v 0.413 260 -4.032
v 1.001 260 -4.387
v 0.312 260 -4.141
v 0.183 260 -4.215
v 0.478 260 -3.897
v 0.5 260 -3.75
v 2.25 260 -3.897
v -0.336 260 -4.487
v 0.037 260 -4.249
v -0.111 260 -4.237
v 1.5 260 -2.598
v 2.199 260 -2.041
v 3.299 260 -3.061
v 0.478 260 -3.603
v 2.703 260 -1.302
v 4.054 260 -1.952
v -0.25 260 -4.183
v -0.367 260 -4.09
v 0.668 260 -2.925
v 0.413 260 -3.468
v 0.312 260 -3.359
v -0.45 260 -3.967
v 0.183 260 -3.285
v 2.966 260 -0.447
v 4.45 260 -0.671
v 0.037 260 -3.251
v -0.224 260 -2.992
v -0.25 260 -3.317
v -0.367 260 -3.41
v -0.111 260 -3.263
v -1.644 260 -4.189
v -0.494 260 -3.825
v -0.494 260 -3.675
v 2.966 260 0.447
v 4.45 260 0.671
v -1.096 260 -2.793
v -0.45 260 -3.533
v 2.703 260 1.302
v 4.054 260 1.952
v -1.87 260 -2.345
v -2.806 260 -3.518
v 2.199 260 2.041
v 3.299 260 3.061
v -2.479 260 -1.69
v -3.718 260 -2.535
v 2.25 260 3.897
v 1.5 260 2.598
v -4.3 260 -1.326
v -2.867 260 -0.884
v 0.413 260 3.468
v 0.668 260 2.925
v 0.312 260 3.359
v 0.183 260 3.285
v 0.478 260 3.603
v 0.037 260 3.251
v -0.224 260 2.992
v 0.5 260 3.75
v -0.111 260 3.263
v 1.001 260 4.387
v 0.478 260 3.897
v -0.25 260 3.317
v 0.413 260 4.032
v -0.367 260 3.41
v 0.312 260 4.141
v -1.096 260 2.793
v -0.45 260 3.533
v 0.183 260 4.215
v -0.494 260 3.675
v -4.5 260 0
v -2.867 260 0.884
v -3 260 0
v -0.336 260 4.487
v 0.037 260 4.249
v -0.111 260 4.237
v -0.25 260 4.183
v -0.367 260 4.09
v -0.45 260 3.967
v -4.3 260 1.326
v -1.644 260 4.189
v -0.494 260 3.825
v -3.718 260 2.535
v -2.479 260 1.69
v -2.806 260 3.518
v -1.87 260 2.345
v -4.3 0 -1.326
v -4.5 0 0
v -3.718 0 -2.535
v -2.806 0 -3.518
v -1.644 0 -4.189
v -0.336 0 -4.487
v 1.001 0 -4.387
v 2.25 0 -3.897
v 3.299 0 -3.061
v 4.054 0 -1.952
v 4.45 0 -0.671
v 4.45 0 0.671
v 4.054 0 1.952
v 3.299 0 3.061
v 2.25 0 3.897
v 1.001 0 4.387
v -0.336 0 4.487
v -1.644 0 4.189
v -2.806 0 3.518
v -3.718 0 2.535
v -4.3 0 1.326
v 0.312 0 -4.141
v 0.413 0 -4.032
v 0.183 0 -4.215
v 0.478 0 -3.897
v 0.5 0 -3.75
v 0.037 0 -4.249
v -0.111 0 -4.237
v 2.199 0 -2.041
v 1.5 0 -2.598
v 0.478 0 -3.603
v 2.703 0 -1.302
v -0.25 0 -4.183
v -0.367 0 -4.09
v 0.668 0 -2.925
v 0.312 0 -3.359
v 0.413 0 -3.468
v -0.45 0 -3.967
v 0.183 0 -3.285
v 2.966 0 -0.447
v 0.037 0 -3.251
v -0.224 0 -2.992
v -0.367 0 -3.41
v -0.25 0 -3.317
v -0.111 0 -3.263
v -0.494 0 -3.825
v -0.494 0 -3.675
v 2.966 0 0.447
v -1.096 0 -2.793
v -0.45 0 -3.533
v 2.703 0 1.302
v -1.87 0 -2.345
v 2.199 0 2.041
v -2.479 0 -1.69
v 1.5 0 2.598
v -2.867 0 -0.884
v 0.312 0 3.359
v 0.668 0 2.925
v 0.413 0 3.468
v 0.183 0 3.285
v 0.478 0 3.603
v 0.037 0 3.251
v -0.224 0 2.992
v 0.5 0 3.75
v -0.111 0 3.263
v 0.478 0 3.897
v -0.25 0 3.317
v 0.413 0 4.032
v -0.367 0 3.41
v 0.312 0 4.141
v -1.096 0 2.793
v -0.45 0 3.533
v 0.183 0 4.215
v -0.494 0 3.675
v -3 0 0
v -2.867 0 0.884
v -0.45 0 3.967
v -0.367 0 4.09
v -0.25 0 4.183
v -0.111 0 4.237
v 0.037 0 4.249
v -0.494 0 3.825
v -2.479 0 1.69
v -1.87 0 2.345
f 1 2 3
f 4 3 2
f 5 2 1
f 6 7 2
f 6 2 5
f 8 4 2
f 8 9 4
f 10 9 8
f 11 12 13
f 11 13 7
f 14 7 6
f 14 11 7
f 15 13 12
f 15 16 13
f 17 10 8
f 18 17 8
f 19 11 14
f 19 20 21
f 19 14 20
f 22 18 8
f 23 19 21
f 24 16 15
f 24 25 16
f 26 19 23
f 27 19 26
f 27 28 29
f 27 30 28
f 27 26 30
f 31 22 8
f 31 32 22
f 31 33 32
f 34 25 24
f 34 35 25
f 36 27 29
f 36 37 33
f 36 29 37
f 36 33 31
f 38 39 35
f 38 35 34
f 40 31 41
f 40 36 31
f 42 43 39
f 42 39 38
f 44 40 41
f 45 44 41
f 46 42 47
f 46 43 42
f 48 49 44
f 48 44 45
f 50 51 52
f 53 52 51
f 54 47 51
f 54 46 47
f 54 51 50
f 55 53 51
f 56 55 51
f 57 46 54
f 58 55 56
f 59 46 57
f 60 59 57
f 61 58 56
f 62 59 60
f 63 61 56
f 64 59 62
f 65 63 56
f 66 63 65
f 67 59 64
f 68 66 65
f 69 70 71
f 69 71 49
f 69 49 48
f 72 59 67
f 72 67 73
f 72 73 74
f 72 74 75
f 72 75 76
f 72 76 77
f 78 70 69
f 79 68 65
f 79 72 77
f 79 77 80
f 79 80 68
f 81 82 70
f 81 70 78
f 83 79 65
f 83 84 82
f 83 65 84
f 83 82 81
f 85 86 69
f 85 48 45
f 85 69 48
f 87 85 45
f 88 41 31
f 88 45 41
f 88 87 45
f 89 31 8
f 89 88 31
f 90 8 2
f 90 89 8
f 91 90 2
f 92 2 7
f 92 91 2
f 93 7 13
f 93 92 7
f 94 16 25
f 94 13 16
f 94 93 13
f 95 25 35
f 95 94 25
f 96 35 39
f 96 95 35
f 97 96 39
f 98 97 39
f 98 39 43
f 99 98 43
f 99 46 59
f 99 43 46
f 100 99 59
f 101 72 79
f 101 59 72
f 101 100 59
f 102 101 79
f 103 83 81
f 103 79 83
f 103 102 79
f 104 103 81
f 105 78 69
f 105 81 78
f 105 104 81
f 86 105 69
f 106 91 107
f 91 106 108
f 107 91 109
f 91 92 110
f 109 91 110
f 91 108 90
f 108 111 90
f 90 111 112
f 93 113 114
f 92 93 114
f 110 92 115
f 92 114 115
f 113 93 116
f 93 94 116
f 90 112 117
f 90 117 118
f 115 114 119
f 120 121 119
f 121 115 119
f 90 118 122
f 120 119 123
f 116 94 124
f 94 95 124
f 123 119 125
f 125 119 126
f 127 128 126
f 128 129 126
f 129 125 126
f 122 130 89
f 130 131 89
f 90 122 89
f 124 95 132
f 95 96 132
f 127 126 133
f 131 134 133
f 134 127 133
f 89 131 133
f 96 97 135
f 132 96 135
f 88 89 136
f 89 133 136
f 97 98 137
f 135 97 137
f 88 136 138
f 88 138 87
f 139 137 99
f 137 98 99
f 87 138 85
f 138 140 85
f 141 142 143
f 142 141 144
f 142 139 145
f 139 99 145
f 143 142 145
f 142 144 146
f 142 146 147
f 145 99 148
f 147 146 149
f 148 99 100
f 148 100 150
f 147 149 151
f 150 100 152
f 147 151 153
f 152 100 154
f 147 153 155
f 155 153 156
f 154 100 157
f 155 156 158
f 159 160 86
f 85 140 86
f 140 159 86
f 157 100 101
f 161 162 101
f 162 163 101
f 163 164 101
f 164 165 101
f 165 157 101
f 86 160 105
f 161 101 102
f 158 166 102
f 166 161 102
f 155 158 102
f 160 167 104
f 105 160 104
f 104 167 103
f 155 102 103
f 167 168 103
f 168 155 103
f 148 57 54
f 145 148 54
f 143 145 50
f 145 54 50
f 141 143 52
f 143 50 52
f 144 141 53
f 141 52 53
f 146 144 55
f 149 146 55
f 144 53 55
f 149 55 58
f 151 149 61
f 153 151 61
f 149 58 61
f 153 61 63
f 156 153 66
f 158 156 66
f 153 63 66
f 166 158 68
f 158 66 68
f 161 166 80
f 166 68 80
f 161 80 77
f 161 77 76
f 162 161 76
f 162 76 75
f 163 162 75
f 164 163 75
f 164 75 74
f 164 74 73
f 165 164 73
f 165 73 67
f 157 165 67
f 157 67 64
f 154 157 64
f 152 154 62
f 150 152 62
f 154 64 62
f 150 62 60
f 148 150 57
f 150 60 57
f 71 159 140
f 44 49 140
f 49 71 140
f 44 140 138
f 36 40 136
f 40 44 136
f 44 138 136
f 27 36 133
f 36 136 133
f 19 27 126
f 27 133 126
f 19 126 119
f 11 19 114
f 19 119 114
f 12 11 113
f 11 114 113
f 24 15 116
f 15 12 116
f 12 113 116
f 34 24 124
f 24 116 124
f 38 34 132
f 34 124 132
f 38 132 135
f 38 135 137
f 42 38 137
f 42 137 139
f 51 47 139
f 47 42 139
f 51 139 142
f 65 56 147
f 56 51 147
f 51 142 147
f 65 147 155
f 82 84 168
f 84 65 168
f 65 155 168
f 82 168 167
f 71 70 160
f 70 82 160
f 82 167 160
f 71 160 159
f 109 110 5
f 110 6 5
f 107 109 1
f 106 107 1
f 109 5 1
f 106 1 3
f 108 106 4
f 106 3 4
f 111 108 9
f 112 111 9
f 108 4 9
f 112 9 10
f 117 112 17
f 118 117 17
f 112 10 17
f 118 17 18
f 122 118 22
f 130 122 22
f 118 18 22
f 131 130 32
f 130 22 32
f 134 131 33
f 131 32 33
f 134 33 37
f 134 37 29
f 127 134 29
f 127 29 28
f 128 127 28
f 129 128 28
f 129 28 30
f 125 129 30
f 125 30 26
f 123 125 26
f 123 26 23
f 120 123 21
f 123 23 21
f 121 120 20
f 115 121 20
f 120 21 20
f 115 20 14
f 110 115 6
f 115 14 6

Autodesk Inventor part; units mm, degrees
ref_plane "YZ Plane" through (0, 0, 0) normal (1, 0, 0) x (0, 1, 0)
ref_plane "XY Plane" through (0, 0, 0) normal (0, 0, 1) x (1, 0, 0)
sketch "Sketch1" plane through (0, 0, 0) normal (0, 1, 0) x (-1, 0, 0)
  circle A0 centre (0, 0) radius 4.5
  circle A1 centre (0, 0) radius 3
  dimension "d0" = 9
  dimension "d1" = 6
extrude "Extrusion1" add sketch "Sketch1" along normal blind 260
ref_plane "Work Plane1" through (0, 130, 0) normal (0, 1, 0) x (-1, 0, 0)
sketch "Sketch2" plane through (0, 260, 0) normal (0, 1, 0) x (1, 0, 0)
  circle A0 centre (0, 3.75) radius 0.5
  point P0 (0, 0)
  dimension "d4" = 1
  dimension "d5" = 3.75
extrude "Extrusion2" cut sketch "Sketch2" against normal through all
mirror "Mirror1" about plane through (0, 0, 0) normal (0, 0, 1) of "Extrusion2"
properties part number "extended_shaft"
